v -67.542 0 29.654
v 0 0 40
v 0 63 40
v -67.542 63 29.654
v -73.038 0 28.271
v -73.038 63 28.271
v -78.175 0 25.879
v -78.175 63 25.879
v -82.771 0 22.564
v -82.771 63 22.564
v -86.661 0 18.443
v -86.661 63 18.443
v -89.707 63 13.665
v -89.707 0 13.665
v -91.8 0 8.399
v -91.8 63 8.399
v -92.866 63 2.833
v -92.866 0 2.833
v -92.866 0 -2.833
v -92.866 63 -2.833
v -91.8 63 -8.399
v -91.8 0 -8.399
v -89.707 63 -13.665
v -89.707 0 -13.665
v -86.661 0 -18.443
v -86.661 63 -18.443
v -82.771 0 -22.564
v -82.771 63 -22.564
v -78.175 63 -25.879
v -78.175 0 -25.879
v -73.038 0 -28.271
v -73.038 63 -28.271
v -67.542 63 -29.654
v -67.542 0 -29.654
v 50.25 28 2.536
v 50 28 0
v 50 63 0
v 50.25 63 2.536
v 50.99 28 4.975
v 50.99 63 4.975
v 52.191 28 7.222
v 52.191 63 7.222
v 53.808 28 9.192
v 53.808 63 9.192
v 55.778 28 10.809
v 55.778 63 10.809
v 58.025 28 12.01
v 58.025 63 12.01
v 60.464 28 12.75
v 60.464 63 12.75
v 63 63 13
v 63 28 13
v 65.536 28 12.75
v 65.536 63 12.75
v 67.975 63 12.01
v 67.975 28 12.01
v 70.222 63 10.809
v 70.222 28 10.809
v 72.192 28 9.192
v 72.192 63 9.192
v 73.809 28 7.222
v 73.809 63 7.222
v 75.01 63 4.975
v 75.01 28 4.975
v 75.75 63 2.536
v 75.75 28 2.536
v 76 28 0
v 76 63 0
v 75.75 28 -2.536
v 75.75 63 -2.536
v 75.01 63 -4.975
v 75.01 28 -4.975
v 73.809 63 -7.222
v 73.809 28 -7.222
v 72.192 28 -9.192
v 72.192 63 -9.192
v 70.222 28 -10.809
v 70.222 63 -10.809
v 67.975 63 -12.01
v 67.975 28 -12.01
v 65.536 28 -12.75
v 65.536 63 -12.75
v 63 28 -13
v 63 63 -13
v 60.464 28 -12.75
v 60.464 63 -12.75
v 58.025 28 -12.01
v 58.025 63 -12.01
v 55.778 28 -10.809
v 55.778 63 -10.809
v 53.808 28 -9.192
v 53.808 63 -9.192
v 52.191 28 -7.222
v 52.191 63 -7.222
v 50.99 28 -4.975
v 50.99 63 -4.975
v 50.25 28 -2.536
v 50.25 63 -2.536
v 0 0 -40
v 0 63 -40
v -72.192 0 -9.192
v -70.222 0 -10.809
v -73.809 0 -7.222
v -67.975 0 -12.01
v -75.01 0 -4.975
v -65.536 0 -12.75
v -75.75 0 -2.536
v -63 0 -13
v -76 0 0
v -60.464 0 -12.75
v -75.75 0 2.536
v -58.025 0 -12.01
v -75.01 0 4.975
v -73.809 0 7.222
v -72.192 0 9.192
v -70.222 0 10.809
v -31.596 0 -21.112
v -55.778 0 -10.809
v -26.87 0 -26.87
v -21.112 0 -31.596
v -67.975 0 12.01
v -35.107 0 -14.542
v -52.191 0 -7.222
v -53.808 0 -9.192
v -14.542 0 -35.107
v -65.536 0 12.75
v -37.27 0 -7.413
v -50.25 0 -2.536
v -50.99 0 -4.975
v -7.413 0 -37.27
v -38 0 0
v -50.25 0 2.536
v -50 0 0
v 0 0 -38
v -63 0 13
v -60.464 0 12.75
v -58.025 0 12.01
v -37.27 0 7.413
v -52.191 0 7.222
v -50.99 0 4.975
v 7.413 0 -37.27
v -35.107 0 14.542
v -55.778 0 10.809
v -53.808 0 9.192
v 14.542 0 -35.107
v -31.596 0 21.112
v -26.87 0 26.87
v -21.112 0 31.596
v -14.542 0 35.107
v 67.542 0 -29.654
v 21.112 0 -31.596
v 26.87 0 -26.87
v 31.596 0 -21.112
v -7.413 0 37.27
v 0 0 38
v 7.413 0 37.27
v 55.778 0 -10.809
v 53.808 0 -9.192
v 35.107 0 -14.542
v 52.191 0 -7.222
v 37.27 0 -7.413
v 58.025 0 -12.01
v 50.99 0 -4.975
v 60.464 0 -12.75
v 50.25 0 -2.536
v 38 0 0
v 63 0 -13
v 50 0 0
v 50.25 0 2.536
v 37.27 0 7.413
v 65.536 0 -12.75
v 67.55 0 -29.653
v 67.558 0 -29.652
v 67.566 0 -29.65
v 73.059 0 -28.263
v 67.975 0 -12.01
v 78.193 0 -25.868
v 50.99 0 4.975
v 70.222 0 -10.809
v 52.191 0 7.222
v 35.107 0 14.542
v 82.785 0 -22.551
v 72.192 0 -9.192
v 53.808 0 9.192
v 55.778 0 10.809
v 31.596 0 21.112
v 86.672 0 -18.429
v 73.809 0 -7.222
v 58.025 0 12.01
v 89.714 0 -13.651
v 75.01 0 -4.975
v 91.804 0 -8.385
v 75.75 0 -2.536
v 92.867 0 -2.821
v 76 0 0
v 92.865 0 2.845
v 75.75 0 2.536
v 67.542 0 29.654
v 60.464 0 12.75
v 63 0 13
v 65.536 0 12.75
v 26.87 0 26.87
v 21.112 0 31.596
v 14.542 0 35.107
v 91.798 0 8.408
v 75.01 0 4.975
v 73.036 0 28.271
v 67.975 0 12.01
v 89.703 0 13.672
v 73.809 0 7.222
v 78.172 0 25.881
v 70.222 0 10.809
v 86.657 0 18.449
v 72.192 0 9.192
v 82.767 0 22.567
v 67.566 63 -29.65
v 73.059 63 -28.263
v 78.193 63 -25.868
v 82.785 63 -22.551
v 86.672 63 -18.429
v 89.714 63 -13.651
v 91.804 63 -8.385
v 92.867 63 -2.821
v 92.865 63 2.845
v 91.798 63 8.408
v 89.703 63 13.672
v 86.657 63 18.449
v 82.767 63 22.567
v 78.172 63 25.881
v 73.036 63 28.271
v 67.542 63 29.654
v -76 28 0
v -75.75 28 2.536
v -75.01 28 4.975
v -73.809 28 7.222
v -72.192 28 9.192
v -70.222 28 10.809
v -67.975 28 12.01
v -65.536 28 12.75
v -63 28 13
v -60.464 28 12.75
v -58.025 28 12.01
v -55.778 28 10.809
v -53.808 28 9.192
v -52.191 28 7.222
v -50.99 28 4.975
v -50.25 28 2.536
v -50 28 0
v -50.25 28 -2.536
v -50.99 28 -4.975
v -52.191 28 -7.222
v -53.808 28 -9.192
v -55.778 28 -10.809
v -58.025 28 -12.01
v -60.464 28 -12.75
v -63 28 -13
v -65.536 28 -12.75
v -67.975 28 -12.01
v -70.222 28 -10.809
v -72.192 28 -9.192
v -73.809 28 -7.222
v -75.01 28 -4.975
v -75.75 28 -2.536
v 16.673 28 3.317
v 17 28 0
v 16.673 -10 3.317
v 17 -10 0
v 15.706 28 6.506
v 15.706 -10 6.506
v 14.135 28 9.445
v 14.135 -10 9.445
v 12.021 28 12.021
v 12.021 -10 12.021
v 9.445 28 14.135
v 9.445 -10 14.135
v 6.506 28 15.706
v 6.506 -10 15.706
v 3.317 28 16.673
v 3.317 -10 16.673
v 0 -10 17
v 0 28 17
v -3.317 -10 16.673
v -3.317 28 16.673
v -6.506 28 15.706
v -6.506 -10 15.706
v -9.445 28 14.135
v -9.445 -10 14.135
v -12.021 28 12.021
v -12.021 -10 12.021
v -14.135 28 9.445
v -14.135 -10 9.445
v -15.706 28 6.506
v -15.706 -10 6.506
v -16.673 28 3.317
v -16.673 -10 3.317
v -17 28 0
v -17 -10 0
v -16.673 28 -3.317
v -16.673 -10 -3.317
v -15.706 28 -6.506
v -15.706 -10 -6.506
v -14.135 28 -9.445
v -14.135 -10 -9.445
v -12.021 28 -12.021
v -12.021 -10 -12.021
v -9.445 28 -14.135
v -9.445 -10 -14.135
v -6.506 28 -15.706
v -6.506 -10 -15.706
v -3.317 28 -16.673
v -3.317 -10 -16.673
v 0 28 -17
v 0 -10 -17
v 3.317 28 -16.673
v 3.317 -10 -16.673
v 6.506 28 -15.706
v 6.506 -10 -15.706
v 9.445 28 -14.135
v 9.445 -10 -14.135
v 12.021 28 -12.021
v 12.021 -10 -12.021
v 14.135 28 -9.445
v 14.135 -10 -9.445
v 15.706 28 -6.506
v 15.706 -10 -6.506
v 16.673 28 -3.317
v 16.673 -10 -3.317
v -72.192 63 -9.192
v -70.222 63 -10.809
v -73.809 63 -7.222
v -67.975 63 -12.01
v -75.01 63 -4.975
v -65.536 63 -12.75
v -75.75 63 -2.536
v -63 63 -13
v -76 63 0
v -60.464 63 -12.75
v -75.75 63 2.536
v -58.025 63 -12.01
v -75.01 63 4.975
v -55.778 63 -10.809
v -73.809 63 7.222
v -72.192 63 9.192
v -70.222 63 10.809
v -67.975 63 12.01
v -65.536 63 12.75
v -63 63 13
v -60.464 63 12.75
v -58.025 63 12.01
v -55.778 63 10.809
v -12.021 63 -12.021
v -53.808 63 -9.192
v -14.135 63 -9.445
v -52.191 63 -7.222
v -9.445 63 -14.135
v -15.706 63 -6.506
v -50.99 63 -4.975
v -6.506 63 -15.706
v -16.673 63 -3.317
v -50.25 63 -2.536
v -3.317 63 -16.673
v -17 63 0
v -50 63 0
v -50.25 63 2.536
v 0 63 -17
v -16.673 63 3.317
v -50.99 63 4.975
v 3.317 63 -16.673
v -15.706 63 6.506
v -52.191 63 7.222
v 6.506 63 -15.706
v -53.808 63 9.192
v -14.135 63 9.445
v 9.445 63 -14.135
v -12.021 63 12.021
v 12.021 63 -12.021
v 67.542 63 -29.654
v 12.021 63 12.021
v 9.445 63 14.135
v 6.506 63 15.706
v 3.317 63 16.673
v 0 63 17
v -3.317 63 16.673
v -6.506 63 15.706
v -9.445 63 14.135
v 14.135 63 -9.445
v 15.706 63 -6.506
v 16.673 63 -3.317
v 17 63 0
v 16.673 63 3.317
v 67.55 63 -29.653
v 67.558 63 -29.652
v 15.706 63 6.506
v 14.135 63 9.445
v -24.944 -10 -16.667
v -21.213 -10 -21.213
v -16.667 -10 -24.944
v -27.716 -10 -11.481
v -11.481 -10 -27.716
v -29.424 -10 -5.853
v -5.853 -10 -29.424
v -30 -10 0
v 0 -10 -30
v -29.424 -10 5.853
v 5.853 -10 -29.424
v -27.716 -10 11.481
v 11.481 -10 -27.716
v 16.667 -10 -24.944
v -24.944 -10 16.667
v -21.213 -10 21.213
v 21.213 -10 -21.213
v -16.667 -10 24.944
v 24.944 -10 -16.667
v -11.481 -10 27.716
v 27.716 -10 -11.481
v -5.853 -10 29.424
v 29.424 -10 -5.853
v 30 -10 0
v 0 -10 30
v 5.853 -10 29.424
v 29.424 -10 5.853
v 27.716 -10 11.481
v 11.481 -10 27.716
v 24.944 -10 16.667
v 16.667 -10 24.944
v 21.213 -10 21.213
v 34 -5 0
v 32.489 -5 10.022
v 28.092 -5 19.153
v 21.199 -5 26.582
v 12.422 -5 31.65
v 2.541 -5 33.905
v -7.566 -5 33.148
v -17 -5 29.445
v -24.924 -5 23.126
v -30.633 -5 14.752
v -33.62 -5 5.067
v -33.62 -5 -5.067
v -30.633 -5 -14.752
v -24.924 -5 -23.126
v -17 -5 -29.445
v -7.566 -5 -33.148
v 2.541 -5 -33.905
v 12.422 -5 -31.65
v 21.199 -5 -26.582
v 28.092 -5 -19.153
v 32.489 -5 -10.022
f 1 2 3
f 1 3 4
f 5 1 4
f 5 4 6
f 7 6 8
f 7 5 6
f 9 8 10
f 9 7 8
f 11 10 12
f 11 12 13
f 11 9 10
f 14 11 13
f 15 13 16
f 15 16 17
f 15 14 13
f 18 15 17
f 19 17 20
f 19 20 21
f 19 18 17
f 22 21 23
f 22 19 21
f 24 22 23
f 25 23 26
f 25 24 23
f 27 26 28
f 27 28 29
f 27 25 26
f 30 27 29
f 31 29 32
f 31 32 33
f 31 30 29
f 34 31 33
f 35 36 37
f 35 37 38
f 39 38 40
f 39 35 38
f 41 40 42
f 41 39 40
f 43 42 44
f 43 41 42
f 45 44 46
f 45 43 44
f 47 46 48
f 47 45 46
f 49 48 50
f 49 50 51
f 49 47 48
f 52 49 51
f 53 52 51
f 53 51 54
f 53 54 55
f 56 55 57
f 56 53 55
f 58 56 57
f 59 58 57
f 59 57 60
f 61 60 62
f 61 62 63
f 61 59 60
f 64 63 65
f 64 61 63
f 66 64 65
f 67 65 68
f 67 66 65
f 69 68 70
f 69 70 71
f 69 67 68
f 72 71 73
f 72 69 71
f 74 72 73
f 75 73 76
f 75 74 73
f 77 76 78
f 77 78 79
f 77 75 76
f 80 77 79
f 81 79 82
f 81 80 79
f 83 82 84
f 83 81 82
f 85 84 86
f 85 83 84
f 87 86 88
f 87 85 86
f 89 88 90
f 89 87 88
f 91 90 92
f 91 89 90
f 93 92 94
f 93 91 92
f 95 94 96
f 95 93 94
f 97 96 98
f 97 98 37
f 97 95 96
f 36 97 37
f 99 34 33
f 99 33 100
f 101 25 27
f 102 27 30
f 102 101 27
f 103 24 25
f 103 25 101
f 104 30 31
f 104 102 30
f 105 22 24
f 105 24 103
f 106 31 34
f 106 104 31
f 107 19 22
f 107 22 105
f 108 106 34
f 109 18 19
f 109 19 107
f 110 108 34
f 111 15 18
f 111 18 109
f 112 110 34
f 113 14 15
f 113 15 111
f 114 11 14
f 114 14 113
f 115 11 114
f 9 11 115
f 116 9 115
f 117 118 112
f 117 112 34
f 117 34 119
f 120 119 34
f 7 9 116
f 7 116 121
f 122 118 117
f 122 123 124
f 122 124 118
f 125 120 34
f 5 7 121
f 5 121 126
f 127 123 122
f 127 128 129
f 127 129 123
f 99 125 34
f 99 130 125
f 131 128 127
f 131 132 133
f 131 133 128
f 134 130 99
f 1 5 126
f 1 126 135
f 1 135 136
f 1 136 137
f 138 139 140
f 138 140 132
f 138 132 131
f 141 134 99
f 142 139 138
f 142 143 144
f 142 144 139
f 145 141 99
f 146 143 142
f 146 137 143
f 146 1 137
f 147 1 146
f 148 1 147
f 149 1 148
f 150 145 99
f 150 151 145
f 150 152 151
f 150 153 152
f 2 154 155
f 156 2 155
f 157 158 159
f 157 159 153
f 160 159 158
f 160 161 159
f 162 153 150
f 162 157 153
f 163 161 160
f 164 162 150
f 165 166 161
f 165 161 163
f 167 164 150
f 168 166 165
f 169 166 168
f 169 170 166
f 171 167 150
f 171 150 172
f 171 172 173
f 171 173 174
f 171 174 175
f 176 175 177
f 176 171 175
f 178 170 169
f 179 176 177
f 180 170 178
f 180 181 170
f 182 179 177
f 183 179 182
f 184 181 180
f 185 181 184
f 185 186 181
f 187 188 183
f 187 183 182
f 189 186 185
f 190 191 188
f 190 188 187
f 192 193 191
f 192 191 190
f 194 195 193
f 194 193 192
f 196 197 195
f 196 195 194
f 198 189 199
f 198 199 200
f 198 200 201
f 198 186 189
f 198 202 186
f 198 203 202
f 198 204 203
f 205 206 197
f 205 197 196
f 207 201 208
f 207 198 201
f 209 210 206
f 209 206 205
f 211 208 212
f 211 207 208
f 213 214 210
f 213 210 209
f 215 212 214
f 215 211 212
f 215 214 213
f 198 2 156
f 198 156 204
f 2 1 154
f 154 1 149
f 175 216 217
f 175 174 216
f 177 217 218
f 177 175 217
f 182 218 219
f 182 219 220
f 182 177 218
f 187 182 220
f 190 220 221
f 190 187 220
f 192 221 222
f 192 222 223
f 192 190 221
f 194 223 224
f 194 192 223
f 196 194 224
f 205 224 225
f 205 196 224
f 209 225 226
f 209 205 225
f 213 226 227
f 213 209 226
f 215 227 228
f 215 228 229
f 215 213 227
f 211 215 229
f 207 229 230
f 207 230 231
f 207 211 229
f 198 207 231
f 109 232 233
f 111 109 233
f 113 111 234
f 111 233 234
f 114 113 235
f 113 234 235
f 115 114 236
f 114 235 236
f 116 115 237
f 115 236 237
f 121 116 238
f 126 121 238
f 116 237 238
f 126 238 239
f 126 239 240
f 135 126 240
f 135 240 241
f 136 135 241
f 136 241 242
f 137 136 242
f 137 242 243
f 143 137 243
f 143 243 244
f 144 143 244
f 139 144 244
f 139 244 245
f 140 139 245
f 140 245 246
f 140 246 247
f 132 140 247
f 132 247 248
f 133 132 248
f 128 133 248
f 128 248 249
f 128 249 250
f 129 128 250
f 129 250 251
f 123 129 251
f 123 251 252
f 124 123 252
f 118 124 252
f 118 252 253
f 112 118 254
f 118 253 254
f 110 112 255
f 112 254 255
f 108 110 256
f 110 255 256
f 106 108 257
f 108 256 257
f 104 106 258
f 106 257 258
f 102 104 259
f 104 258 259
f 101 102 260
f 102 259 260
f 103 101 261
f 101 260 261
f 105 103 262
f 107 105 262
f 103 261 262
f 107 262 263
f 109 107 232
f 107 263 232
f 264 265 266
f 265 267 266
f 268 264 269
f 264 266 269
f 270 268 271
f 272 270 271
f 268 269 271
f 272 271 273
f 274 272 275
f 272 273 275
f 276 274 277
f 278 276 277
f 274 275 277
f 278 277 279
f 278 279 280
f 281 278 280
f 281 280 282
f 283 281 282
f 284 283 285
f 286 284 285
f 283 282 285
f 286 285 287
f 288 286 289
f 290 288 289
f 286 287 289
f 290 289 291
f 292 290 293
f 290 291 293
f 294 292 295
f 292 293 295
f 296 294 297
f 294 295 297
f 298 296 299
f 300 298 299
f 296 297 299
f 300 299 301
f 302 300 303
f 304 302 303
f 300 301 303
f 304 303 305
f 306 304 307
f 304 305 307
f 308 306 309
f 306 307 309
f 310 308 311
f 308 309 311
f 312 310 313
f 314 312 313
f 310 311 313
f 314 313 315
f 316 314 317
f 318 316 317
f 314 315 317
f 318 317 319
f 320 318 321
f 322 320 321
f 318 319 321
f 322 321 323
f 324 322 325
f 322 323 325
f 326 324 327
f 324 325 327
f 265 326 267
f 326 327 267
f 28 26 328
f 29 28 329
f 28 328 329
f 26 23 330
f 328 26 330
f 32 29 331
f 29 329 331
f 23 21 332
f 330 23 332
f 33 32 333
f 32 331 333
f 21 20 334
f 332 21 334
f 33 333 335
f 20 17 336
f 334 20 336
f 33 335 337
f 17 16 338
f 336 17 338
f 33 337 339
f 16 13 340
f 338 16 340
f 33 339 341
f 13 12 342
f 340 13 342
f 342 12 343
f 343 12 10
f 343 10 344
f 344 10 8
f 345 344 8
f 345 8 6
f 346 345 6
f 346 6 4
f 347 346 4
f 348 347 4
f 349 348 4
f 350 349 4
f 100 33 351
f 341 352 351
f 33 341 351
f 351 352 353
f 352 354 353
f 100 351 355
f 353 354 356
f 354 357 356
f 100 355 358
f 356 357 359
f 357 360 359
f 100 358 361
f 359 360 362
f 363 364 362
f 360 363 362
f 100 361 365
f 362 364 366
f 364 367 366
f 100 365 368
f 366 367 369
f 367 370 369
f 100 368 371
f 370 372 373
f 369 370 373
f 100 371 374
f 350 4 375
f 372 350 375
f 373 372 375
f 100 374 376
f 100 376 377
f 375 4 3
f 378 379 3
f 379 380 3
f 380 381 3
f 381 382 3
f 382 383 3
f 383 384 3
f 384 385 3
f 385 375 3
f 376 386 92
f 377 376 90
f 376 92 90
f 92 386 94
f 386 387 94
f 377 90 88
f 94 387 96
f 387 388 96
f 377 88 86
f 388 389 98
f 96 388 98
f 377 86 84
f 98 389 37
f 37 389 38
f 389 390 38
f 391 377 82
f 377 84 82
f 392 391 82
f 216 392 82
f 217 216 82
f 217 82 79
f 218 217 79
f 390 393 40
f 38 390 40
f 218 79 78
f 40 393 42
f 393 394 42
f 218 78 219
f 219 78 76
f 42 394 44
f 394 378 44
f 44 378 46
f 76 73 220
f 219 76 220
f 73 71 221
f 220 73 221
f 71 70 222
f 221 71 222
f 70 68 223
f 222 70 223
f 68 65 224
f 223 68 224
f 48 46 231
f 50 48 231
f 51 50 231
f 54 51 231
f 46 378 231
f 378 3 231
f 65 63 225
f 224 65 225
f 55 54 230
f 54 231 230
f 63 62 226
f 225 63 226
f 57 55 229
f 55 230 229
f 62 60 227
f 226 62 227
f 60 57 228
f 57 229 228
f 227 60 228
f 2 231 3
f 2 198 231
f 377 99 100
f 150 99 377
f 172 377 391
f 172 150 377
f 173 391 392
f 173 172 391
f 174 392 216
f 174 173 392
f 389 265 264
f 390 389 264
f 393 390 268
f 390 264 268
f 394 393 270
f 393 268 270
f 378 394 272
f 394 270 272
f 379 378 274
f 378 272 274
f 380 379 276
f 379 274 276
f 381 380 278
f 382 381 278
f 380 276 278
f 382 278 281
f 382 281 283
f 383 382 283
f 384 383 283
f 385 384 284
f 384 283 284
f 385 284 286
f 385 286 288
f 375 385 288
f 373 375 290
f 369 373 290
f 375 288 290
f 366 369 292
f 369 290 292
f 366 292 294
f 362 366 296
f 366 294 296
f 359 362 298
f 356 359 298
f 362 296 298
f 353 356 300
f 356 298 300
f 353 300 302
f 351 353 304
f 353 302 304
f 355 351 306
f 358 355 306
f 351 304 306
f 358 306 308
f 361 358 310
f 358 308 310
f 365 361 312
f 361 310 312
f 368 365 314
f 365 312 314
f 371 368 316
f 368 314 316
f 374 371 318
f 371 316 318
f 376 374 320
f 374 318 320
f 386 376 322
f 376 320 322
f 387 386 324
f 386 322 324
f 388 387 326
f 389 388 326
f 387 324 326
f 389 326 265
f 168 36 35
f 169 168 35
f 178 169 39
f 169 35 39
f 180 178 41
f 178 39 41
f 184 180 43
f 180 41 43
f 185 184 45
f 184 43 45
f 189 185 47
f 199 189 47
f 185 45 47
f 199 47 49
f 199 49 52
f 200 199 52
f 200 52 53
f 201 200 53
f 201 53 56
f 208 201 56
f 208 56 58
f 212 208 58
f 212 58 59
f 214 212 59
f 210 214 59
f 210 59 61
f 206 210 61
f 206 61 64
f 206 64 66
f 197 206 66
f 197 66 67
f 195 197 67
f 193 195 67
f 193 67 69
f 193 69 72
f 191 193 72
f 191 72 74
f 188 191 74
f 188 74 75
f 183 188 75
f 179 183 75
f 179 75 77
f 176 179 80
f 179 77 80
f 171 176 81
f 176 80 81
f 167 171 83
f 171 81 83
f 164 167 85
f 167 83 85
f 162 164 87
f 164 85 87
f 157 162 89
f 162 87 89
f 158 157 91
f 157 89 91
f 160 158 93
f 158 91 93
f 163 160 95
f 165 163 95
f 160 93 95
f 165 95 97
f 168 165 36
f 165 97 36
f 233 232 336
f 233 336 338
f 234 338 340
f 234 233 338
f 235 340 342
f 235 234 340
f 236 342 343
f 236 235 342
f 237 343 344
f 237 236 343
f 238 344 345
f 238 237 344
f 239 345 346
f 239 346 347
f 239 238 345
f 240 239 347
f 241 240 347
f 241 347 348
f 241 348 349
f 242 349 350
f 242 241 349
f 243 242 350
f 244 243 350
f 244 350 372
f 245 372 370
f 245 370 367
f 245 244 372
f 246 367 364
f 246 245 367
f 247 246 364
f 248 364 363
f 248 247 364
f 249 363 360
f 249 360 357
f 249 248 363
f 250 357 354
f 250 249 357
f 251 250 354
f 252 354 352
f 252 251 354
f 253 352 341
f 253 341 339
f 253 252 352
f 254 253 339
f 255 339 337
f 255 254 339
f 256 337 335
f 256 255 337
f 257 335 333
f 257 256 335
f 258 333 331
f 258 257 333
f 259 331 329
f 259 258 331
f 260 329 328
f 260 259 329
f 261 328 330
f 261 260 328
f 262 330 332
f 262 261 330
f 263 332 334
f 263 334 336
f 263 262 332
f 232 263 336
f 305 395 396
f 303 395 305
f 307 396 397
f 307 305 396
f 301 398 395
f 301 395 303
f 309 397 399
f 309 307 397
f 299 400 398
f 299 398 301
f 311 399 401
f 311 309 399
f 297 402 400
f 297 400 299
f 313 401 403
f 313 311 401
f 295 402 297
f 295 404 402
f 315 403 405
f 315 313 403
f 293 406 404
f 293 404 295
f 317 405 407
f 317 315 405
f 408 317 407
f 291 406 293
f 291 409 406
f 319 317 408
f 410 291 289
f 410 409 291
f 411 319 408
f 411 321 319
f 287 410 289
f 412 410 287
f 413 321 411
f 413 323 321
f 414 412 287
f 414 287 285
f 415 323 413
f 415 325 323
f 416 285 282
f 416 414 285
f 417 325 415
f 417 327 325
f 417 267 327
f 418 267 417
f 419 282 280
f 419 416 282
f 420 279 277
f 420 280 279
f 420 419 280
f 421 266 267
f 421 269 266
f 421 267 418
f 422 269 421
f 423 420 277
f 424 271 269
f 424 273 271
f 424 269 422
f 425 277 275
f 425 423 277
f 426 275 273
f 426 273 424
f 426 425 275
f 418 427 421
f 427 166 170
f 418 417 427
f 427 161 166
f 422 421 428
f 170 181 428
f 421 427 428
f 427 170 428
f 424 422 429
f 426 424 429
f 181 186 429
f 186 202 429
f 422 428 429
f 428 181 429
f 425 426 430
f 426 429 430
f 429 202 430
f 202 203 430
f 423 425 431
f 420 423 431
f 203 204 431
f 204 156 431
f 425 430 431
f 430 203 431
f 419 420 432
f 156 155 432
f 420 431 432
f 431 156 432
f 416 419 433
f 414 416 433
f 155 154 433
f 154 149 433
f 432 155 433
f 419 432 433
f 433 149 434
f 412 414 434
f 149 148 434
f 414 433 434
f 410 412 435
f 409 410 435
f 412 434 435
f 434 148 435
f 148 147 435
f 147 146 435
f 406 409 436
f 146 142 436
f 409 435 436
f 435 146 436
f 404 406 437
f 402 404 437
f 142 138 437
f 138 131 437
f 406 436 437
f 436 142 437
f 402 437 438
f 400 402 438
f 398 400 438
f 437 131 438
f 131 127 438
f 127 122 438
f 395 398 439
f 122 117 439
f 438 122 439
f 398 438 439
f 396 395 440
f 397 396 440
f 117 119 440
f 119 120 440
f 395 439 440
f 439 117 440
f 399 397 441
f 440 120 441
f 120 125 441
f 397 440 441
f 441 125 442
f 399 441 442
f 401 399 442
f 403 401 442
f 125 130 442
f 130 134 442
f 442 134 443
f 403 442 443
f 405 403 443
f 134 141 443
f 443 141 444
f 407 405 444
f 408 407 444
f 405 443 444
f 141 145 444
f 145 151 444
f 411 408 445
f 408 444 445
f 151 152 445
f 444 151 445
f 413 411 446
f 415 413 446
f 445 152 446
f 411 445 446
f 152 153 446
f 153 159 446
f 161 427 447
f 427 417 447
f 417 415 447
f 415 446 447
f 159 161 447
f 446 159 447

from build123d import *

# Parameters (mm, degrees)
F0_R      = 13
F0_R_2    = 38
F1_DEPTH  = 28
F3_R      = 30
F5_D      = 26
F6_D      = 26
F7_D      = 34
F7_DEPTH  = 28.001
F8_R      = 17
F9_DEPTH  = 25
F10_DEPTH = 35


# Not quite as in the source:
# - ends of sketch curves that miss each other by under 0.0002 mm in the source are joined


with BuildPart() as f1:
    # F0 (on Front) → F1 (new body)
    with BuildSketch(Plane.XZ):
        with BuildLine():
            Line((67.5423051658, 29.6541306361), (0, 40))
            Line((0, 40), (-67.5423051658, 29.6541306361))
            ThreePointArc((-67.5423051658, 29.6541306361), (-93, 0), (-67.5423051658, -29.6541306361))
            Line((-67.5423051658, -29.6541306361), (0, -40))
            Line((0, -40), (67.5423036859, -29.6541209752))
            ThreePointArc((67.5423036859, -29.6541209752), (67.5542752903, -29.6522946259), (67.5662446728, -29.6504537839))
            ThreePointArc((67.5662446728, -29.6504537839), (92.9999975558, 0.0121101119), (67.5423051658, 29.6541306361))
        make_face()
        with Locations((-63, 0)):
            Circle(F0_R, mode=Mode.SUBTRACT)
        Circle(F0_R_2, mode=Mode.SUBTRACT)
        with Locations((63, 0)):
            Circle(F0_R, mode=Mode.SUBTRACT)
        with Locations((-63, 0)):
            Circle(F0_R)
        Circle(F0_R_2)
        with Locations((63, 0)):
            Circle(F0_R)
    extrude(amount=-F1_DEPTH)

    # F3 (on offset) → F4 section 0
    with BuildSketch(Plane.XZ.offset(10)):
        Circle(F3_R)
    # F0 (on Front) → F4 section 1
    with BuildSketch(Plane.XZ):
        Circle(F0_R_2)
    loft()

    # F5 (through all)
    with Locations(Plane.XZ):
        with Locations((-63, 0)):
            Hole(F5_D / 2)

    # F6 (through all)
    with Locations(Plane.XZ):
        with Locations((63, 0)):
            Hole(F6_D / 2)

    # F7 (through all, one way)
    with BuildSketch(Plane.XZ):
        with Locations((0, 0)):
            Circle(F7_D / 2)
    extrude(amount=-F7_DEPTH, mode=Mode.SUBTRACT)

    # F8 (on face) → F9 (cut)
    with BuildSketch(Plane.XZ.offset(10)):
        Circle(F8_R)
    extrude(amount=-F9_DEPTH, mode=Mode.SUBTRACT)

    # F10 (add): a face of the model
    f10_faces = [f1.faces().sort_by_distance(p)[0] for p in [
        (90.975250823, 28, 0.0112927815),
    ]]
    extrude(f10_faces, amount=F10_DEPTH)


solid = f1.part
